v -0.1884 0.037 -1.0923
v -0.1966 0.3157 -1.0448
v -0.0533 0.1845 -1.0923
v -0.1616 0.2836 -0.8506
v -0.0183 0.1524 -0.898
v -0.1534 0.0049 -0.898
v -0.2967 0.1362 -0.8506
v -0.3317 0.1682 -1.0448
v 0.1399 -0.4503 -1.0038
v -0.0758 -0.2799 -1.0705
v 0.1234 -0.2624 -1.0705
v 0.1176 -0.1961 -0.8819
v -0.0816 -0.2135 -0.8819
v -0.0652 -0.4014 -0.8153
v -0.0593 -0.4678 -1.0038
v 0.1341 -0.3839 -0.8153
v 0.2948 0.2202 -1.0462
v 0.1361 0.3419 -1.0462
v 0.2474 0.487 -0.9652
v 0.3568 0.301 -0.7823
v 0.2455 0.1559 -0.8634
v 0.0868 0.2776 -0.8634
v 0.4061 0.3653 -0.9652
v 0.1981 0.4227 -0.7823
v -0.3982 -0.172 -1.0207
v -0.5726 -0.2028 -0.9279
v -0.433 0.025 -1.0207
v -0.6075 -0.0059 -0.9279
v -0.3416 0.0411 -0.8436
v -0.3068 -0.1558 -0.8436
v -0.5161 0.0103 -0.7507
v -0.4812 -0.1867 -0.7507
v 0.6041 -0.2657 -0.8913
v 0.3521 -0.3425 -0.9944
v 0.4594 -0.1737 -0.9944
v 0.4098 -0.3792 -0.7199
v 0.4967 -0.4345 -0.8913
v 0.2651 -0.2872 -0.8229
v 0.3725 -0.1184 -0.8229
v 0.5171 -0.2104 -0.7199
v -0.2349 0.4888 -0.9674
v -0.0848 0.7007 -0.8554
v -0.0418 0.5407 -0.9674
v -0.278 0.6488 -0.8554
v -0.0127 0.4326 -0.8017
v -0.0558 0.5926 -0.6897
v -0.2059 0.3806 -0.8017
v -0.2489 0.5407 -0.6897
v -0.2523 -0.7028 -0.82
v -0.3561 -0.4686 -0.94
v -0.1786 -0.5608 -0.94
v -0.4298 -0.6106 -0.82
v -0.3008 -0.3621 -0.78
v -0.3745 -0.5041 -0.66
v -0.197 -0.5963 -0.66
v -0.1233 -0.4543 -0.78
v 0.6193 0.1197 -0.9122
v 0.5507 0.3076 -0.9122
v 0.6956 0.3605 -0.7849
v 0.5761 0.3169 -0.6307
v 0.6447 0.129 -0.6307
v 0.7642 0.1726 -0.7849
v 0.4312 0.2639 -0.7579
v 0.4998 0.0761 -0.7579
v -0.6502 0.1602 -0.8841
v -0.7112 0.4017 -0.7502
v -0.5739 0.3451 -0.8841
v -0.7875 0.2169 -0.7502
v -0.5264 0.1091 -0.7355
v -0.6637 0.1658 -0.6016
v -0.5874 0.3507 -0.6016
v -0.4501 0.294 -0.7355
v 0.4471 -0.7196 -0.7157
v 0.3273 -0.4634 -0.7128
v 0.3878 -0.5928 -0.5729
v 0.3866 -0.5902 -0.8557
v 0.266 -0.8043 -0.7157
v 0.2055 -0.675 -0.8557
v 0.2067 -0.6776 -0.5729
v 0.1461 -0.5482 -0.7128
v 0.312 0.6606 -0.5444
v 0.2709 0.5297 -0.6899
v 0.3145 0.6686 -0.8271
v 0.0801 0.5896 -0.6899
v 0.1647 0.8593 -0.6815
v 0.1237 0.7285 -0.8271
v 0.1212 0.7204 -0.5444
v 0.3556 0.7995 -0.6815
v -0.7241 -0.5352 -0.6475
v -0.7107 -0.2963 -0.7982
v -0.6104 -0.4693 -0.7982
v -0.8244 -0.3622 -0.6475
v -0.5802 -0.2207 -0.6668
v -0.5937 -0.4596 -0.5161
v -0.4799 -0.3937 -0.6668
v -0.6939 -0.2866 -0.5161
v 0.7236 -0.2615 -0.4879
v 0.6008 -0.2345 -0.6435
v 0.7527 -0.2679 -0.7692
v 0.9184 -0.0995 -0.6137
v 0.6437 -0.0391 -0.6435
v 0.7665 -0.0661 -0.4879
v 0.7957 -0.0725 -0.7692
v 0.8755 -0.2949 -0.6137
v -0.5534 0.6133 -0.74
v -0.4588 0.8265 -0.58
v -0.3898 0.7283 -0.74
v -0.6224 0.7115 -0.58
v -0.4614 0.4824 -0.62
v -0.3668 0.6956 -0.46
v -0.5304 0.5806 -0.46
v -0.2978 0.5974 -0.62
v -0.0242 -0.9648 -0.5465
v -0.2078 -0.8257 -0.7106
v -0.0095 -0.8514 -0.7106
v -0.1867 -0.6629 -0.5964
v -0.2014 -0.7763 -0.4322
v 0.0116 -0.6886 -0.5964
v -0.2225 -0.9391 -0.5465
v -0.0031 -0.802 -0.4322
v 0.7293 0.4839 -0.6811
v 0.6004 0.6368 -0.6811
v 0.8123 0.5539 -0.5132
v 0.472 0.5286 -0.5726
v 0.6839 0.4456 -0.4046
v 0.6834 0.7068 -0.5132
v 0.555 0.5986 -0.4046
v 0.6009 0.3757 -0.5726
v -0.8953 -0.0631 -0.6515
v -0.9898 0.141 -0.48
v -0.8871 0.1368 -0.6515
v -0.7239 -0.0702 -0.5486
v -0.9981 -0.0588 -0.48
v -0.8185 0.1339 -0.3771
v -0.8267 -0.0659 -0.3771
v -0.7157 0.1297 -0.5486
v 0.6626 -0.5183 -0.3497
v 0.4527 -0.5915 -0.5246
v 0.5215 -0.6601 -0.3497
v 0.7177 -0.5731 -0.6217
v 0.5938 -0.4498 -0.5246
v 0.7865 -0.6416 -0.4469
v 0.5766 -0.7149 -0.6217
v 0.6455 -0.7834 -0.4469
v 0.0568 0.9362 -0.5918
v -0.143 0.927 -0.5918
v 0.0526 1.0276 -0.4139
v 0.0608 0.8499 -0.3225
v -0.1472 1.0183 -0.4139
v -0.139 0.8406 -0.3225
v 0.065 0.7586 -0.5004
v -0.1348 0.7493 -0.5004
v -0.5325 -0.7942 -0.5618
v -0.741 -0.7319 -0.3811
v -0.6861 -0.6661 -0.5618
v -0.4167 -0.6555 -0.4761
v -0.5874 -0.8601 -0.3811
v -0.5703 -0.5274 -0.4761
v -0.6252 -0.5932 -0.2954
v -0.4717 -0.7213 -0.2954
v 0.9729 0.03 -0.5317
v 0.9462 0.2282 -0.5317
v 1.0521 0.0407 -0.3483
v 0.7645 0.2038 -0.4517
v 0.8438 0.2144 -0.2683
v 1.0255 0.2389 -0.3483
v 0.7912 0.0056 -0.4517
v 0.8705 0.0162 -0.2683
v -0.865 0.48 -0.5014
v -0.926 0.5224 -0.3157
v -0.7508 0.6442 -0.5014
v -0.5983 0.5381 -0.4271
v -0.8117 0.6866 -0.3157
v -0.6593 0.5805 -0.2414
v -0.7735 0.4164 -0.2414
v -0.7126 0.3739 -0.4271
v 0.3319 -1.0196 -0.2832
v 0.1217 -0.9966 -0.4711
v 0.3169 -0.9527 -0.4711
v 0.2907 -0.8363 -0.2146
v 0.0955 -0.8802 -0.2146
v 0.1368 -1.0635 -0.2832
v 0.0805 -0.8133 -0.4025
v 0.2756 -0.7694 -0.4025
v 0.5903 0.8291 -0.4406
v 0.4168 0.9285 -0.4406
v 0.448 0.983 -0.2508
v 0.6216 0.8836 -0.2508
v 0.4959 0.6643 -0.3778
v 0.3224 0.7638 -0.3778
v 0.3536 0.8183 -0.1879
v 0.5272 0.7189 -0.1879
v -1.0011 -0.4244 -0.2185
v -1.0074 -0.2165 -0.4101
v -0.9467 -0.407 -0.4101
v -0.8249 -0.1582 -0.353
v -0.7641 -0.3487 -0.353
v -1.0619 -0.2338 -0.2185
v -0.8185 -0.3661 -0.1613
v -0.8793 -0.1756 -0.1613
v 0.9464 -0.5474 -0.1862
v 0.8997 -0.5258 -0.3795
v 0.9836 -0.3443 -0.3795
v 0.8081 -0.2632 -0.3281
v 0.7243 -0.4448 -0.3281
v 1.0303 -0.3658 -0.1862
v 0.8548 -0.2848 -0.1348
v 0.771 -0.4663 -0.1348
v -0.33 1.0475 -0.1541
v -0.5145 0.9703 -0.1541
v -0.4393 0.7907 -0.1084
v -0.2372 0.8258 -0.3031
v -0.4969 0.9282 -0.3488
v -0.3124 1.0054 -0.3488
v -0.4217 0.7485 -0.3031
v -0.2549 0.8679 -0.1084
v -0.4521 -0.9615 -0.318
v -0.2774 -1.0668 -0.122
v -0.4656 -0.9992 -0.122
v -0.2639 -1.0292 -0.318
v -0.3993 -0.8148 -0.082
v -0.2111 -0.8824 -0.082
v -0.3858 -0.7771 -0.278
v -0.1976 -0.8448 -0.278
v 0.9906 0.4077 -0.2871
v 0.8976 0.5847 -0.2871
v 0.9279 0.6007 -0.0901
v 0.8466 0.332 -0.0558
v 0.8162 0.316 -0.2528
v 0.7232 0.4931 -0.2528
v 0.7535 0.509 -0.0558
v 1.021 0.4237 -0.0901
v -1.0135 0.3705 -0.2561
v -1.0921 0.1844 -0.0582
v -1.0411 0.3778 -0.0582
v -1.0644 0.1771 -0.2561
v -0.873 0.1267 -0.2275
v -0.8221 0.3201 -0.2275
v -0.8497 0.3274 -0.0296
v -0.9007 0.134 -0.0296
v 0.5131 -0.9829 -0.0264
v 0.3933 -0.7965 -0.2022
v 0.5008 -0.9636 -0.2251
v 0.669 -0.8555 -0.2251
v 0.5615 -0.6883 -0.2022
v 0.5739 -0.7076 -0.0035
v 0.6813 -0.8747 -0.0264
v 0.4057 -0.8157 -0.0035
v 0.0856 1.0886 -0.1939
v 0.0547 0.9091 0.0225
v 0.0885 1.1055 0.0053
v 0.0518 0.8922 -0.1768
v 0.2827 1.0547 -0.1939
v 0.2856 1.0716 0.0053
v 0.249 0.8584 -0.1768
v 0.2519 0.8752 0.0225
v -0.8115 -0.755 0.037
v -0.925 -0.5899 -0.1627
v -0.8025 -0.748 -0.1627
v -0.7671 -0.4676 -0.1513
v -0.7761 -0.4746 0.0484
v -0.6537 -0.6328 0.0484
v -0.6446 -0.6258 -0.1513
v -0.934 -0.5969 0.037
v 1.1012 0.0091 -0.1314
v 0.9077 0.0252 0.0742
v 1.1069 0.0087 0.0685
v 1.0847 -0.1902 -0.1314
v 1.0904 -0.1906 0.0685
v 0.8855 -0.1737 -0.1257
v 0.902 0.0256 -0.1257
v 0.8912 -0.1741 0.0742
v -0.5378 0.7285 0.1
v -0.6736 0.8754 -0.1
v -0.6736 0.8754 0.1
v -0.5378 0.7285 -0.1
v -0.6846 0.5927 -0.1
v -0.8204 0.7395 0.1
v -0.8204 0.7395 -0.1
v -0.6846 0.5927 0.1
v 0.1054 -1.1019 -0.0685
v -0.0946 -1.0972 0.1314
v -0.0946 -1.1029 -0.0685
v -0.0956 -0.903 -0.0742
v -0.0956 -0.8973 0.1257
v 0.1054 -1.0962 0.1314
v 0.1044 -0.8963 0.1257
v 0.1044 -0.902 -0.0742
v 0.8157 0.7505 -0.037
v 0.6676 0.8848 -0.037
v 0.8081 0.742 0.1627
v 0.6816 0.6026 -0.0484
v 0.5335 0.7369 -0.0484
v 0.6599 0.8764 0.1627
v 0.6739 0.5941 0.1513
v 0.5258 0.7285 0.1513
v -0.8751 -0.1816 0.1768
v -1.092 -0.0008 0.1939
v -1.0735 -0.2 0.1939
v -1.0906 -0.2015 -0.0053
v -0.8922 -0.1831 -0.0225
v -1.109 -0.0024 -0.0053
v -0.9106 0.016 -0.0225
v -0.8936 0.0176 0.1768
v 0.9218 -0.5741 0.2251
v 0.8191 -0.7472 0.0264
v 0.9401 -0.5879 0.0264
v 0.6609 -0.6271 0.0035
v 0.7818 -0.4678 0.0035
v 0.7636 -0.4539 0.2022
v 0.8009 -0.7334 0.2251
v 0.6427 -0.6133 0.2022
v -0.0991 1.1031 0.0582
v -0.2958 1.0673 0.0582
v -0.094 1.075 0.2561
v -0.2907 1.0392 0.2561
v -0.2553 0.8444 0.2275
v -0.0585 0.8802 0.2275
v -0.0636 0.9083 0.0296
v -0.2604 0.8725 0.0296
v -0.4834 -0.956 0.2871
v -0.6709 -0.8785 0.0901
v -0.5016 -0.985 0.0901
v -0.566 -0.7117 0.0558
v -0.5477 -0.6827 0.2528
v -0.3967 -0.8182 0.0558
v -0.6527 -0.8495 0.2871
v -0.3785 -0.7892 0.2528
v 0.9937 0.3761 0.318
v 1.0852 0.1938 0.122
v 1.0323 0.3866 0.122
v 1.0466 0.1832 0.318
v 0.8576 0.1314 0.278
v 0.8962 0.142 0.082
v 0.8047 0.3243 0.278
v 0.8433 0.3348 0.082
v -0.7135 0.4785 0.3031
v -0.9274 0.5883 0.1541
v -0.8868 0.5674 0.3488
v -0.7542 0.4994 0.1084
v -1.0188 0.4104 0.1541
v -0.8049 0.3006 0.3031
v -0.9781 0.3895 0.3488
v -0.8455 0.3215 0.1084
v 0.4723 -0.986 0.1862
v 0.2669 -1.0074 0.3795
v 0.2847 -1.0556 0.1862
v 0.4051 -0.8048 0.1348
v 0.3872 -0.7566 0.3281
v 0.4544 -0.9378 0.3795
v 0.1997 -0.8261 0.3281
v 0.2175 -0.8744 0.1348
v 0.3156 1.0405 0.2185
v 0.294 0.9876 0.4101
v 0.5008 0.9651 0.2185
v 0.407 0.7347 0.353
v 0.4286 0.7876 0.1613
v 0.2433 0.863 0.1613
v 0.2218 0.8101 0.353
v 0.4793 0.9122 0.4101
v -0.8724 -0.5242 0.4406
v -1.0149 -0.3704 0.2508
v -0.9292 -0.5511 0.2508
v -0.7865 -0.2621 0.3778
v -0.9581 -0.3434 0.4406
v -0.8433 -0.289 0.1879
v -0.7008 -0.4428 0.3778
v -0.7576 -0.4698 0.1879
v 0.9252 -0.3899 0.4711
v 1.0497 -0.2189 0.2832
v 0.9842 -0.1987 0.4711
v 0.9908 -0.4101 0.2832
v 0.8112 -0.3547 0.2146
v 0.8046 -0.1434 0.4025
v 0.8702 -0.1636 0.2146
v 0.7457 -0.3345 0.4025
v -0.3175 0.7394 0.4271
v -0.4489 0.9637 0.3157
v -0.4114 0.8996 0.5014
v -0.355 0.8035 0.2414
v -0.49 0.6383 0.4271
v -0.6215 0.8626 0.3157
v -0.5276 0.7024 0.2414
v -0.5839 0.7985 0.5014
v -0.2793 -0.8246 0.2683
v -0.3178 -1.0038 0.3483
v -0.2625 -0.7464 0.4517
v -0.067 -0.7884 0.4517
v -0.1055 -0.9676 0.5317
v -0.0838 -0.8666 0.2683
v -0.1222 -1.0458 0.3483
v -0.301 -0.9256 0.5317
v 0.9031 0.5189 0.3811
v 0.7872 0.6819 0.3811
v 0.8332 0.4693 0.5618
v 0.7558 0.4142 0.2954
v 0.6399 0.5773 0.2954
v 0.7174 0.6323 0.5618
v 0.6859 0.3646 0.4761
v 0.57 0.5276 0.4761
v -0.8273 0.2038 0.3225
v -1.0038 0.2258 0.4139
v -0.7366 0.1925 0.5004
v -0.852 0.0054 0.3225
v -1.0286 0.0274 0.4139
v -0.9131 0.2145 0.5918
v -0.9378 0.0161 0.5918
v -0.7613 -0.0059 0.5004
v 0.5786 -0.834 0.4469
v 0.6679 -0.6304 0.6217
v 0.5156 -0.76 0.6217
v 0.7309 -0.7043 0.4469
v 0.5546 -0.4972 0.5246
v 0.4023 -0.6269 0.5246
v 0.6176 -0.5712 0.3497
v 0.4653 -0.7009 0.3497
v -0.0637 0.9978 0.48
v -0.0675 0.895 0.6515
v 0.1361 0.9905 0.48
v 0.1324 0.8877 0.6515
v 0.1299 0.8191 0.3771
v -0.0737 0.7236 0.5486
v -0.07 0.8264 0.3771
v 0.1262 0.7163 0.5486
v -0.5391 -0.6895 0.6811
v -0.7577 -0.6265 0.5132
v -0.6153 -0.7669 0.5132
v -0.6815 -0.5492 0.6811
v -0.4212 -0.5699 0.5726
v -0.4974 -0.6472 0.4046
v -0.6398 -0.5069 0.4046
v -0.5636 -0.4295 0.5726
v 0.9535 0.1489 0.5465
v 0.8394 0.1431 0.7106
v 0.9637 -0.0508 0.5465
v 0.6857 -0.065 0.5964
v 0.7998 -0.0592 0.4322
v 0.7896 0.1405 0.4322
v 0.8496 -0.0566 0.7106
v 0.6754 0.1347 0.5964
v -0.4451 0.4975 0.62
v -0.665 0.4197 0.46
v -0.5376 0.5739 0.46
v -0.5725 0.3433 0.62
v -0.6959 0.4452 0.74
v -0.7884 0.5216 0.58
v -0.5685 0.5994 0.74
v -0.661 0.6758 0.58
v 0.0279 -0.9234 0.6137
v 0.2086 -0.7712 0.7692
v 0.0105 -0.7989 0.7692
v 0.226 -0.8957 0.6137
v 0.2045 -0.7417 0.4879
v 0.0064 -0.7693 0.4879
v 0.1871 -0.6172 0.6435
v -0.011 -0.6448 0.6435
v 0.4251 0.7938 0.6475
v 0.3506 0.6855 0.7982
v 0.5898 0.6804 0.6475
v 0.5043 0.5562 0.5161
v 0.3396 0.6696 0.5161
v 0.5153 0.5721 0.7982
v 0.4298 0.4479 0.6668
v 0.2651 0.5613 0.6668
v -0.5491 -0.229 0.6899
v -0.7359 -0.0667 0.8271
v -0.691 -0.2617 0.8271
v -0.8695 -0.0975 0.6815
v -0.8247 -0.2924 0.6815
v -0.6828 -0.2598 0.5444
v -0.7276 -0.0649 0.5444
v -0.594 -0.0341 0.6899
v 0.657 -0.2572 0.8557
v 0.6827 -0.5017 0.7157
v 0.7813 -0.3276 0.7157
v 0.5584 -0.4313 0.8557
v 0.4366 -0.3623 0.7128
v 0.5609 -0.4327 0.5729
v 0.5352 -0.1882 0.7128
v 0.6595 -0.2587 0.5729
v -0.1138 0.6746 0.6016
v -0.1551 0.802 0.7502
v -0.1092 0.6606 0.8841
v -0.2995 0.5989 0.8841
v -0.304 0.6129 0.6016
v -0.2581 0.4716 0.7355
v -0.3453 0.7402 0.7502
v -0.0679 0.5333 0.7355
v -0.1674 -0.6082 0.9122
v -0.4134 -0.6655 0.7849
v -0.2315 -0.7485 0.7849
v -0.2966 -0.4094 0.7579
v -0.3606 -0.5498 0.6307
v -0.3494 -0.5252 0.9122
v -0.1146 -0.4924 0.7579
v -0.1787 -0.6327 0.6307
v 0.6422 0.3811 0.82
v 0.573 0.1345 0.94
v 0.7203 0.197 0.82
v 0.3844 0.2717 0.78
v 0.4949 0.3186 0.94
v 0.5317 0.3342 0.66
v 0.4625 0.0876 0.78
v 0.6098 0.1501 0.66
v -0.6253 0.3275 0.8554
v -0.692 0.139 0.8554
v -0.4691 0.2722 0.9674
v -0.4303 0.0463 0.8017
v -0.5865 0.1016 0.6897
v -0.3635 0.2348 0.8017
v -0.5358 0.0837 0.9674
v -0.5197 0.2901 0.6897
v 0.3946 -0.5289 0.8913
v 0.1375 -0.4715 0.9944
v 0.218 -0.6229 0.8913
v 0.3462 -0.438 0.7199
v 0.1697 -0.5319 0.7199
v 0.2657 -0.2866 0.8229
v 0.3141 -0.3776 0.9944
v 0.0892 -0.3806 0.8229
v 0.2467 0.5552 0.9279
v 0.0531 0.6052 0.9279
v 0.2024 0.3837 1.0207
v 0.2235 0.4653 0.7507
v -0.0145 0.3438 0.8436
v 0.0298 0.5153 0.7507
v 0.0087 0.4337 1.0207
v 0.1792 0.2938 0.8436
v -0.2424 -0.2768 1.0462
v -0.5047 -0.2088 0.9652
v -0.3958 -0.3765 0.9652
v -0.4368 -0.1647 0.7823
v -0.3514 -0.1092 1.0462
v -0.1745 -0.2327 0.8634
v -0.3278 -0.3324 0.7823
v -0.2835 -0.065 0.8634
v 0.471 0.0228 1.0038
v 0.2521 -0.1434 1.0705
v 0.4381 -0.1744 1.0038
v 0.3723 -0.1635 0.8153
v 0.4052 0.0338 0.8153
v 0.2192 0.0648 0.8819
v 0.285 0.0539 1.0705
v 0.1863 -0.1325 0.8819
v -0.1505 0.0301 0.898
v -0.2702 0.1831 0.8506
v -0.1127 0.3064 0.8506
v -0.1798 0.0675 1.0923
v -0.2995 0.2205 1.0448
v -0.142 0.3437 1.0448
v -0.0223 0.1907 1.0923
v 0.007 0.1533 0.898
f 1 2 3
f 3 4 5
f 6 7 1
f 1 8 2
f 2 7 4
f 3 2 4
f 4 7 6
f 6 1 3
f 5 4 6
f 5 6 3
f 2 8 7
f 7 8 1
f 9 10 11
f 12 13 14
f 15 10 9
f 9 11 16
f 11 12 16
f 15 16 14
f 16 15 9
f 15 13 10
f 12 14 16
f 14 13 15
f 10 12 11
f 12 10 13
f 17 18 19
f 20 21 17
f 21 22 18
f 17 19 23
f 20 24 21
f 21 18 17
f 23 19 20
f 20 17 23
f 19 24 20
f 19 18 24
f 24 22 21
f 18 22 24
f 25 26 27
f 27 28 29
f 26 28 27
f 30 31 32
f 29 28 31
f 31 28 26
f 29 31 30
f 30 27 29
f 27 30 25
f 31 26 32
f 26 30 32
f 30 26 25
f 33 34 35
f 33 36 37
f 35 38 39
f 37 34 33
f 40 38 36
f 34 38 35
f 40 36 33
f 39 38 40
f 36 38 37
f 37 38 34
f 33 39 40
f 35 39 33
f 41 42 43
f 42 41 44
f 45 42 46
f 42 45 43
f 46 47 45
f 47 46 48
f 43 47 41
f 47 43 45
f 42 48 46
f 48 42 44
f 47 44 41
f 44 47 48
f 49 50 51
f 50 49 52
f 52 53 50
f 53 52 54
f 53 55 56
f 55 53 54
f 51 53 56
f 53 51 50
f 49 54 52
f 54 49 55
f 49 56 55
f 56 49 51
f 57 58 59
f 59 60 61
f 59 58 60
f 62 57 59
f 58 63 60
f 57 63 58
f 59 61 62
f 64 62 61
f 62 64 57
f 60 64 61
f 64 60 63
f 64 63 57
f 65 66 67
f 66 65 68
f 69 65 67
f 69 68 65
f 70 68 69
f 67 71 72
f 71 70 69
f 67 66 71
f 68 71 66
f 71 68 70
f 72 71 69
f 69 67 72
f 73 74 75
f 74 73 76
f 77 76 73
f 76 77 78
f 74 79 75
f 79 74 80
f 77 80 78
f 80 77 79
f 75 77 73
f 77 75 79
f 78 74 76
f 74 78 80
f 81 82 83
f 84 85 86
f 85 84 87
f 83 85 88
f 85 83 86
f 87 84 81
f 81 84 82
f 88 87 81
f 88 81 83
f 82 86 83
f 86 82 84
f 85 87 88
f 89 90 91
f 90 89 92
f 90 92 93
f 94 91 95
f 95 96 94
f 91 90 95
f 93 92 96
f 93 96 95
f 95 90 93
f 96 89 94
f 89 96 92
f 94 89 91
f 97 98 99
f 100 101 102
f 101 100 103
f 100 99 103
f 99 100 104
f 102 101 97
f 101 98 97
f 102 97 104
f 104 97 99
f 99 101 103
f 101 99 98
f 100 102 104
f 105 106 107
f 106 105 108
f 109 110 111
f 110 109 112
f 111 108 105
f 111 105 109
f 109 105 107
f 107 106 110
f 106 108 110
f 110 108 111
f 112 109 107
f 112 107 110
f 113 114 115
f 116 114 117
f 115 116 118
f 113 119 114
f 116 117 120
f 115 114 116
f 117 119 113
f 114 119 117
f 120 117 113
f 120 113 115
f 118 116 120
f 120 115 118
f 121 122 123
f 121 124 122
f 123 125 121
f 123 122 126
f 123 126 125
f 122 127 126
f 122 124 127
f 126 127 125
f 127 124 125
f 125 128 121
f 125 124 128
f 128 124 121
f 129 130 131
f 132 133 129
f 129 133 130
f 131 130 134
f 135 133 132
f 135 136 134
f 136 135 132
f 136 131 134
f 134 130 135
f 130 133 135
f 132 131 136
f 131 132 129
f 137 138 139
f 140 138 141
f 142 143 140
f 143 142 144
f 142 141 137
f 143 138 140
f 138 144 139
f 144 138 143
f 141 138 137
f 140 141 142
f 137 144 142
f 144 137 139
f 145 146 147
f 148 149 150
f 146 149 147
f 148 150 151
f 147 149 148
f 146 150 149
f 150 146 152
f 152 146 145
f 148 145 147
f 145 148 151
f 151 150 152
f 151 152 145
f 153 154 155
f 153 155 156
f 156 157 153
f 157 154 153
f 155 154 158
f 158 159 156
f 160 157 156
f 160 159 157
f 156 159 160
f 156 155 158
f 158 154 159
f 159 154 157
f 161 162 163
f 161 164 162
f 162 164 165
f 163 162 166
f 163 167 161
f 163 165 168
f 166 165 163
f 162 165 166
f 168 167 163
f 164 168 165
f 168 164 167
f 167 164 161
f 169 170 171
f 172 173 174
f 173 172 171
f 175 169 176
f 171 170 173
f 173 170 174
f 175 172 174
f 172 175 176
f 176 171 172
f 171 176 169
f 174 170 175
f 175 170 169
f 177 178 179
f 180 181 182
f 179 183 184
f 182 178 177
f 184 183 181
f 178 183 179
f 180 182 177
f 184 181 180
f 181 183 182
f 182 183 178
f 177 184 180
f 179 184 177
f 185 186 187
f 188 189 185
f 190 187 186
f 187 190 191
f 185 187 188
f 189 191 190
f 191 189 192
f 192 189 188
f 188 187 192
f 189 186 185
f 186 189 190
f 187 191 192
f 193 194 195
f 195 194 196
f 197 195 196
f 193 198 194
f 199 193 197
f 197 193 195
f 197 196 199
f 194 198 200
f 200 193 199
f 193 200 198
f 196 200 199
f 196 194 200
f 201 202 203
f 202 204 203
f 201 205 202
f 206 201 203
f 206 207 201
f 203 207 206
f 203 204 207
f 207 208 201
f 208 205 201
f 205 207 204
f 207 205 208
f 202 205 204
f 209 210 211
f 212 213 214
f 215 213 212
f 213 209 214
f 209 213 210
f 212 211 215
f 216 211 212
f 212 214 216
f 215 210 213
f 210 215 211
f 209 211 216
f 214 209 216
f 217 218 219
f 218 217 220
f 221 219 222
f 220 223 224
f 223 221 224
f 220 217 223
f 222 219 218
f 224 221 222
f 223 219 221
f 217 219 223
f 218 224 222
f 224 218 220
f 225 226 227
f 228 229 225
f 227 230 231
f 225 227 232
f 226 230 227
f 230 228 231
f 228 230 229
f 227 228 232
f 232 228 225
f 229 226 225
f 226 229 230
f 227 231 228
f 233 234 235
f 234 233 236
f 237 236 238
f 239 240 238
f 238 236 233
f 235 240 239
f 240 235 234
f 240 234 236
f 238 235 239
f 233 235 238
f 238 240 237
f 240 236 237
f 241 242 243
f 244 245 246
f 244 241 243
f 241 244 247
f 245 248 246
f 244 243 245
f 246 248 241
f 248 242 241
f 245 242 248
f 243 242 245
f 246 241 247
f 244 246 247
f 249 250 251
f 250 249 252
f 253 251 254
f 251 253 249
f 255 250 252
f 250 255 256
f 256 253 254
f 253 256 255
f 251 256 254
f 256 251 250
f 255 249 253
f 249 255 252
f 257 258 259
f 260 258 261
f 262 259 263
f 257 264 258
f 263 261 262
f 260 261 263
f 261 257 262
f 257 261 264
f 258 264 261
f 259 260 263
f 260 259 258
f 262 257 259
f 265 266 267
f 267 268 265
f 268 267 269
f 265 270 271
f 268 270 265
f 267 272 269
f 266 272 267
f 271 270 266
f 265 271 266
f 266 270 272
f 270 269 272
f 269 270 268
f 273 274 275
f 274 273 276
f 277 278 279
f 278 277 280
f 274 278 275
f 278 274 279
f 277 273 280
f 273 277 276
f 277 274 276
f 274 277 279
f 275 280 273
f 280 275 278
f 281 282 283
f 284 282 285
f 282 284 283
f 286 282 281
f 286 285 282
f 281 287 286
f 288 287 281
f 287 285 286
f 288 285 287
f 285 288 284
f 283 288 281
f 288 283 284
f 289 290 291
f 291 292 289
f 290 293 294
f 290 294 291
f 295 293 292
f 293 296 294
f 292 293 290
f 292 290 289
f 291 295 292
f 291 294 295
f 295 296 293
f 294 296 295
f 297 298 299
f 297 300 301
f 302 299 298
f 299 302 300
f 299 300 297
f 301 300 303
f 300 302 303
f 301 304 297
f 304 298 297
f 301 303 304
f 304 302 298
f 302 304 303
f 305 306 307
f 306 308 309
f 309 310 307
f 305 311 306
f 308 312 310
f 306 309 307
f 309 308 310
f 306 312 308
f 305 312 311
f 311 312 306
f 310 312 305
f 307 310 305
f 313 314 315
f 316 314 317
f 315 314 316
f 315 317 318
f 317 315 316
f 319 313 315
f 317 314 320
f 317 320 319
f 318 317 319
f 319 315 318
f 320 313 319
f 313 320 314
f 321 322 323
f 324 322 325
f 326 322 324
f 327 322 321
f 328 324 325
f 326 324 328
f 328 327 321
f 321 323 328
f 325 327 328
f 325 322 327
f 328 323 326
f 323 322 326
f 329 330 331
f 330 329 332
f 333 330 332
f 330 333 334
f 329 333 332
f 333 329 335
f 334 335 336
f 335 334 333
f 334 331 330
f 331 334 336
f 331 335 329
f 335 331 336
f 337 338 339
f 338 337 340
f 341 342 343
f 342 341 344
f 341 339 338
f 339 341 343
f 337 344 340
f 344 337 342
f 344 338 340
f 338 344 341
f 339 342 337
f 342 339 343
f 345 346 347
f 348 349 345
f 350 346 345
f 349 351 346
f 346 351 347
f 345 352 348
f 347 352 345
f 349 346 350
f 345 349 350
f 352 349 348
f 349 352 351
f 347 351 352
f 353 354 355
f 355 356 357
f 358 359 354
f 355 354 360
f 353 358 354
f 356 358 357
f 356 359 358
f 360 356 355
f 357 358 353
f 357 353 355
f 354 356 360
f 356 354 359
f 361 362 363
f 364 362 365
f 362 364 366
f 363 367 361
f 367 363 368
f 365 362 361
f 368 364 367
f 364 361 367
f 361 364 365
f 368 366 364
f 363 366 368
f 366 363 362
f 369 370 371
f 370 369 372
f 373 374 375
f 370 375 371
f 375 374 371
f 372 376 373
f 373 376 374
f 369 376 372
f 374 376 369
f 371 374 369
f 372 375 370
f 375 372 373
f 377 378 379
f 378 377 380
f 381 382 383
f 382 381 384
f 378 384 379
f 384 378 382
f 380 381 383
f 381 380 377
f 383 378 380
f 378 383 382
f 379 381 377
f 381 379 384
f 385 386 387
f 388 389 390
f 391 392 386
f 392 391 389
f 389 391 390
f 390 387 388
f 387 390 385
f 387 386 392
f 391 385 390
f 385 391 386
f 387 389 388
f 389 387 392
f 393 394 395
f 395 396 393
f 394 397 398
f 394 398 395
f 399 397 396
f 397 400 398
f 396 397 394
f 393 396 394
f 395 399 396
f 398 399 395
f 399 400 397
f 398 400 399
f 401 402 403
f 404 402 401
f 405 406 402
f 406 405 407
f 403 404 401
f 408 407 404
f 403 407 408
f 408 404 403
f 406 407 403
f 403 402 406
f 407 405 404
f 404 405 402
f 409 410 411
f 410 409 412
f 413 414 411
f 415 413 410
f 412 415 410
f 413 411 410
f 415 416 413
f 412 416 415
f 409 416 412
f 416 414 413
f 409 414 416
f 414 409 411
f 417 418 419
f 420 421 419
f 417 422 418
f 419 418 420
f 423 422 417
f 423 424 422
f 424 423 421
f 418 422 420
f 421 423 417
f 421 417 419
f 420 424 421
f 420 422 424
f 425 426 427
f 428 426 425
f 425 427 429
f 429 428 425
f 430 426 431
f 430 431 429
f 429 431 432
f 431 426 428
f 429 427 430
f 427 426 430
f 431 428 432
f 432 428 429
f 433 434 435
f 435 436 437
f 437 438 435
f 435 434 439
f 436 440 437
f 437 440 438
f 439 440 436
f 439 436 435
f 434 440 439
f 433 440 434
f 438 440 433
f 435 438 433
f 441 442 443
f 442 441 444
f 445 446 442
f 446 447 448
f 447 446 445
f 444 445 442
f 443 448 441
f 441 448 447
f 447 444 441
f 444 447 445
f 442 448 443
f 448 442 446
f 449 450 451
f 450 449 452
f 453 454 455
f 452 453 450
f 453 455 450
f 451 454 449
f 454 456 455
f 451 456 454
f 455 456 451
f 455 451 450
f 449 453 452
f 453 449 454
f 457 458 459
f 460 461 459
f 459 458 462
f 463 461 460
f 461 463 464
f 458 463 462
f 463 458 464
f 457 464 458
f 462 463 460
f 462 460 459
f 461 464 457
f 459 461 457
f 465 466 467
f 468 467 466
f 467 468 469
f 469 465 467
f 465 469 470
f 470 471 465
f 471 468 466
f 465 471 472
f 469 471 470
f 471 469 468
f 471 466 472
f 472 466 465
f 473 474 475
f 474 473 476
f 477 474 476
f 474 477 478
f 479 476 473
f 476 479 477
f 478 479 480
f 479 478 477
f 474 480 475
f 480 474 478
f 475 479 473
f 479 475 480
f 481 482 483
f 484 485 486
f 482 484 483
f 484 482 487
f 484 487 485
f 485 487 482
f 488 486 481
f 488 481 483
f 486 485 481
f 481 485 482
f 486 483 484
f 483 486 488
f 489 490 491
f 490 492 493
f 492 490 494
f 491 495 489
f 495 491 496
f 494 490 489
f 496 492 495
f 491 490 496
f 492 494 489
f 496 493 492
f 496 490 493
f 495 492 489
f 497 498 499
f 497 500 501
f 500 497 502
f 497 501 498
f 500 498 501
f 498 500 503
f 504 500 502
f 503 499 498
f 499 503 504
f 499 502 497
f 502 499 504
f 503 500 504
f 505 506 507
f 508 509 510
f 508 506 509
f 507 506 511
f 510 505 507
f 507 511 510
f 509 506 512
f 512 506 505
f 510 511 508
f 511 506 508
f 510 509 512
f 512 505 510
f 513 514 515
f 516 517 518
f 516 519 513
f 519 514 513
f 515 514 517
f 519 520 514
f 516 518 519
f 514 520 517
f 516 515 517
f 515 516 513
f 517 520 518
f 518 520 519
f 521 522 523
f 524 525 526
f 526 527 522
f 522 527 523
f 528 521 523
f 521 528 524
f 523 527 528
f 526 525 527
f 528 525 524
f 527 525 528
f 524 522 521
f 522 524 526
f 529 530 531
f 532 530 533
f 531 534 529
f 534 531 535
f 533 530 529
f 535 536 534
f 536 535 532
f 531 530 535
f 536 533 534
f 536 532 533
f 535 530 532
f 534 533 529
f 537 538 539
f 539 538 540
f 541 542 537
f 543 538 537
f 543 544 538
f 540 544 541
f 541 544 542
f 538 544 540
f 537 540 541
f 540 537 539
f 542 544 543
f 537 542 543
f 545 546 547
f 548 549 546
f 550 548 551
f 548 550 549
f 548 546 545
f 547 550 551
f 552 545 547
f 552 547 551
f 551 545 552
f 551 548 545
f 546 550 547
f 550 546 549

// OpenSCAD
// file: lib/fibonalize.scad
module fibonalize(N=100,R=1.0,spin=false) {
    PHI = 2.618033; // golden section
    union() {
        for(i=[1:N-1]) { // skip last one, because often too close to another one
           z = 2*i/N - 1;
           r = sqrt(1-z*z);
           theta = 360*i/PHI;
           phi = (z+1)*90;
           gamma = spin ? theta : 0;
           c = cos(theta); // OpenSCAD's sin() and cos() take angles
           s = sin(theta); // in degrees !!! (omg !)
           x = r*c; 
           y = r*s; 
           Z = [x,y,z];
           X = [-s,c,0];
           Y = cross(Z,X);
           multmatrix(
               [[   X[0], Y[0], Z[0], x],
                [   X[1], Y[1], Z[1], y],
                [   X[2], Y[2], Z[2], z],
                [      0,    0,    0, 1]]
           ) scale(R) rotate(gamma) children();
       }
    }
}
// main file
include <lib/fibonalize.scad>

fibonalize(R=0.2,N=70) cube(center=true);

// fibonalize(R=0.2,N=100) cylinder(center=true,h=0.1,$fn=30);


// fibonalize(R=0.2,N=100) cylinder(center=true,h=3.0,$fn=5);

// fibonalize(R=0.5,N=100) sphere($fn=30);
